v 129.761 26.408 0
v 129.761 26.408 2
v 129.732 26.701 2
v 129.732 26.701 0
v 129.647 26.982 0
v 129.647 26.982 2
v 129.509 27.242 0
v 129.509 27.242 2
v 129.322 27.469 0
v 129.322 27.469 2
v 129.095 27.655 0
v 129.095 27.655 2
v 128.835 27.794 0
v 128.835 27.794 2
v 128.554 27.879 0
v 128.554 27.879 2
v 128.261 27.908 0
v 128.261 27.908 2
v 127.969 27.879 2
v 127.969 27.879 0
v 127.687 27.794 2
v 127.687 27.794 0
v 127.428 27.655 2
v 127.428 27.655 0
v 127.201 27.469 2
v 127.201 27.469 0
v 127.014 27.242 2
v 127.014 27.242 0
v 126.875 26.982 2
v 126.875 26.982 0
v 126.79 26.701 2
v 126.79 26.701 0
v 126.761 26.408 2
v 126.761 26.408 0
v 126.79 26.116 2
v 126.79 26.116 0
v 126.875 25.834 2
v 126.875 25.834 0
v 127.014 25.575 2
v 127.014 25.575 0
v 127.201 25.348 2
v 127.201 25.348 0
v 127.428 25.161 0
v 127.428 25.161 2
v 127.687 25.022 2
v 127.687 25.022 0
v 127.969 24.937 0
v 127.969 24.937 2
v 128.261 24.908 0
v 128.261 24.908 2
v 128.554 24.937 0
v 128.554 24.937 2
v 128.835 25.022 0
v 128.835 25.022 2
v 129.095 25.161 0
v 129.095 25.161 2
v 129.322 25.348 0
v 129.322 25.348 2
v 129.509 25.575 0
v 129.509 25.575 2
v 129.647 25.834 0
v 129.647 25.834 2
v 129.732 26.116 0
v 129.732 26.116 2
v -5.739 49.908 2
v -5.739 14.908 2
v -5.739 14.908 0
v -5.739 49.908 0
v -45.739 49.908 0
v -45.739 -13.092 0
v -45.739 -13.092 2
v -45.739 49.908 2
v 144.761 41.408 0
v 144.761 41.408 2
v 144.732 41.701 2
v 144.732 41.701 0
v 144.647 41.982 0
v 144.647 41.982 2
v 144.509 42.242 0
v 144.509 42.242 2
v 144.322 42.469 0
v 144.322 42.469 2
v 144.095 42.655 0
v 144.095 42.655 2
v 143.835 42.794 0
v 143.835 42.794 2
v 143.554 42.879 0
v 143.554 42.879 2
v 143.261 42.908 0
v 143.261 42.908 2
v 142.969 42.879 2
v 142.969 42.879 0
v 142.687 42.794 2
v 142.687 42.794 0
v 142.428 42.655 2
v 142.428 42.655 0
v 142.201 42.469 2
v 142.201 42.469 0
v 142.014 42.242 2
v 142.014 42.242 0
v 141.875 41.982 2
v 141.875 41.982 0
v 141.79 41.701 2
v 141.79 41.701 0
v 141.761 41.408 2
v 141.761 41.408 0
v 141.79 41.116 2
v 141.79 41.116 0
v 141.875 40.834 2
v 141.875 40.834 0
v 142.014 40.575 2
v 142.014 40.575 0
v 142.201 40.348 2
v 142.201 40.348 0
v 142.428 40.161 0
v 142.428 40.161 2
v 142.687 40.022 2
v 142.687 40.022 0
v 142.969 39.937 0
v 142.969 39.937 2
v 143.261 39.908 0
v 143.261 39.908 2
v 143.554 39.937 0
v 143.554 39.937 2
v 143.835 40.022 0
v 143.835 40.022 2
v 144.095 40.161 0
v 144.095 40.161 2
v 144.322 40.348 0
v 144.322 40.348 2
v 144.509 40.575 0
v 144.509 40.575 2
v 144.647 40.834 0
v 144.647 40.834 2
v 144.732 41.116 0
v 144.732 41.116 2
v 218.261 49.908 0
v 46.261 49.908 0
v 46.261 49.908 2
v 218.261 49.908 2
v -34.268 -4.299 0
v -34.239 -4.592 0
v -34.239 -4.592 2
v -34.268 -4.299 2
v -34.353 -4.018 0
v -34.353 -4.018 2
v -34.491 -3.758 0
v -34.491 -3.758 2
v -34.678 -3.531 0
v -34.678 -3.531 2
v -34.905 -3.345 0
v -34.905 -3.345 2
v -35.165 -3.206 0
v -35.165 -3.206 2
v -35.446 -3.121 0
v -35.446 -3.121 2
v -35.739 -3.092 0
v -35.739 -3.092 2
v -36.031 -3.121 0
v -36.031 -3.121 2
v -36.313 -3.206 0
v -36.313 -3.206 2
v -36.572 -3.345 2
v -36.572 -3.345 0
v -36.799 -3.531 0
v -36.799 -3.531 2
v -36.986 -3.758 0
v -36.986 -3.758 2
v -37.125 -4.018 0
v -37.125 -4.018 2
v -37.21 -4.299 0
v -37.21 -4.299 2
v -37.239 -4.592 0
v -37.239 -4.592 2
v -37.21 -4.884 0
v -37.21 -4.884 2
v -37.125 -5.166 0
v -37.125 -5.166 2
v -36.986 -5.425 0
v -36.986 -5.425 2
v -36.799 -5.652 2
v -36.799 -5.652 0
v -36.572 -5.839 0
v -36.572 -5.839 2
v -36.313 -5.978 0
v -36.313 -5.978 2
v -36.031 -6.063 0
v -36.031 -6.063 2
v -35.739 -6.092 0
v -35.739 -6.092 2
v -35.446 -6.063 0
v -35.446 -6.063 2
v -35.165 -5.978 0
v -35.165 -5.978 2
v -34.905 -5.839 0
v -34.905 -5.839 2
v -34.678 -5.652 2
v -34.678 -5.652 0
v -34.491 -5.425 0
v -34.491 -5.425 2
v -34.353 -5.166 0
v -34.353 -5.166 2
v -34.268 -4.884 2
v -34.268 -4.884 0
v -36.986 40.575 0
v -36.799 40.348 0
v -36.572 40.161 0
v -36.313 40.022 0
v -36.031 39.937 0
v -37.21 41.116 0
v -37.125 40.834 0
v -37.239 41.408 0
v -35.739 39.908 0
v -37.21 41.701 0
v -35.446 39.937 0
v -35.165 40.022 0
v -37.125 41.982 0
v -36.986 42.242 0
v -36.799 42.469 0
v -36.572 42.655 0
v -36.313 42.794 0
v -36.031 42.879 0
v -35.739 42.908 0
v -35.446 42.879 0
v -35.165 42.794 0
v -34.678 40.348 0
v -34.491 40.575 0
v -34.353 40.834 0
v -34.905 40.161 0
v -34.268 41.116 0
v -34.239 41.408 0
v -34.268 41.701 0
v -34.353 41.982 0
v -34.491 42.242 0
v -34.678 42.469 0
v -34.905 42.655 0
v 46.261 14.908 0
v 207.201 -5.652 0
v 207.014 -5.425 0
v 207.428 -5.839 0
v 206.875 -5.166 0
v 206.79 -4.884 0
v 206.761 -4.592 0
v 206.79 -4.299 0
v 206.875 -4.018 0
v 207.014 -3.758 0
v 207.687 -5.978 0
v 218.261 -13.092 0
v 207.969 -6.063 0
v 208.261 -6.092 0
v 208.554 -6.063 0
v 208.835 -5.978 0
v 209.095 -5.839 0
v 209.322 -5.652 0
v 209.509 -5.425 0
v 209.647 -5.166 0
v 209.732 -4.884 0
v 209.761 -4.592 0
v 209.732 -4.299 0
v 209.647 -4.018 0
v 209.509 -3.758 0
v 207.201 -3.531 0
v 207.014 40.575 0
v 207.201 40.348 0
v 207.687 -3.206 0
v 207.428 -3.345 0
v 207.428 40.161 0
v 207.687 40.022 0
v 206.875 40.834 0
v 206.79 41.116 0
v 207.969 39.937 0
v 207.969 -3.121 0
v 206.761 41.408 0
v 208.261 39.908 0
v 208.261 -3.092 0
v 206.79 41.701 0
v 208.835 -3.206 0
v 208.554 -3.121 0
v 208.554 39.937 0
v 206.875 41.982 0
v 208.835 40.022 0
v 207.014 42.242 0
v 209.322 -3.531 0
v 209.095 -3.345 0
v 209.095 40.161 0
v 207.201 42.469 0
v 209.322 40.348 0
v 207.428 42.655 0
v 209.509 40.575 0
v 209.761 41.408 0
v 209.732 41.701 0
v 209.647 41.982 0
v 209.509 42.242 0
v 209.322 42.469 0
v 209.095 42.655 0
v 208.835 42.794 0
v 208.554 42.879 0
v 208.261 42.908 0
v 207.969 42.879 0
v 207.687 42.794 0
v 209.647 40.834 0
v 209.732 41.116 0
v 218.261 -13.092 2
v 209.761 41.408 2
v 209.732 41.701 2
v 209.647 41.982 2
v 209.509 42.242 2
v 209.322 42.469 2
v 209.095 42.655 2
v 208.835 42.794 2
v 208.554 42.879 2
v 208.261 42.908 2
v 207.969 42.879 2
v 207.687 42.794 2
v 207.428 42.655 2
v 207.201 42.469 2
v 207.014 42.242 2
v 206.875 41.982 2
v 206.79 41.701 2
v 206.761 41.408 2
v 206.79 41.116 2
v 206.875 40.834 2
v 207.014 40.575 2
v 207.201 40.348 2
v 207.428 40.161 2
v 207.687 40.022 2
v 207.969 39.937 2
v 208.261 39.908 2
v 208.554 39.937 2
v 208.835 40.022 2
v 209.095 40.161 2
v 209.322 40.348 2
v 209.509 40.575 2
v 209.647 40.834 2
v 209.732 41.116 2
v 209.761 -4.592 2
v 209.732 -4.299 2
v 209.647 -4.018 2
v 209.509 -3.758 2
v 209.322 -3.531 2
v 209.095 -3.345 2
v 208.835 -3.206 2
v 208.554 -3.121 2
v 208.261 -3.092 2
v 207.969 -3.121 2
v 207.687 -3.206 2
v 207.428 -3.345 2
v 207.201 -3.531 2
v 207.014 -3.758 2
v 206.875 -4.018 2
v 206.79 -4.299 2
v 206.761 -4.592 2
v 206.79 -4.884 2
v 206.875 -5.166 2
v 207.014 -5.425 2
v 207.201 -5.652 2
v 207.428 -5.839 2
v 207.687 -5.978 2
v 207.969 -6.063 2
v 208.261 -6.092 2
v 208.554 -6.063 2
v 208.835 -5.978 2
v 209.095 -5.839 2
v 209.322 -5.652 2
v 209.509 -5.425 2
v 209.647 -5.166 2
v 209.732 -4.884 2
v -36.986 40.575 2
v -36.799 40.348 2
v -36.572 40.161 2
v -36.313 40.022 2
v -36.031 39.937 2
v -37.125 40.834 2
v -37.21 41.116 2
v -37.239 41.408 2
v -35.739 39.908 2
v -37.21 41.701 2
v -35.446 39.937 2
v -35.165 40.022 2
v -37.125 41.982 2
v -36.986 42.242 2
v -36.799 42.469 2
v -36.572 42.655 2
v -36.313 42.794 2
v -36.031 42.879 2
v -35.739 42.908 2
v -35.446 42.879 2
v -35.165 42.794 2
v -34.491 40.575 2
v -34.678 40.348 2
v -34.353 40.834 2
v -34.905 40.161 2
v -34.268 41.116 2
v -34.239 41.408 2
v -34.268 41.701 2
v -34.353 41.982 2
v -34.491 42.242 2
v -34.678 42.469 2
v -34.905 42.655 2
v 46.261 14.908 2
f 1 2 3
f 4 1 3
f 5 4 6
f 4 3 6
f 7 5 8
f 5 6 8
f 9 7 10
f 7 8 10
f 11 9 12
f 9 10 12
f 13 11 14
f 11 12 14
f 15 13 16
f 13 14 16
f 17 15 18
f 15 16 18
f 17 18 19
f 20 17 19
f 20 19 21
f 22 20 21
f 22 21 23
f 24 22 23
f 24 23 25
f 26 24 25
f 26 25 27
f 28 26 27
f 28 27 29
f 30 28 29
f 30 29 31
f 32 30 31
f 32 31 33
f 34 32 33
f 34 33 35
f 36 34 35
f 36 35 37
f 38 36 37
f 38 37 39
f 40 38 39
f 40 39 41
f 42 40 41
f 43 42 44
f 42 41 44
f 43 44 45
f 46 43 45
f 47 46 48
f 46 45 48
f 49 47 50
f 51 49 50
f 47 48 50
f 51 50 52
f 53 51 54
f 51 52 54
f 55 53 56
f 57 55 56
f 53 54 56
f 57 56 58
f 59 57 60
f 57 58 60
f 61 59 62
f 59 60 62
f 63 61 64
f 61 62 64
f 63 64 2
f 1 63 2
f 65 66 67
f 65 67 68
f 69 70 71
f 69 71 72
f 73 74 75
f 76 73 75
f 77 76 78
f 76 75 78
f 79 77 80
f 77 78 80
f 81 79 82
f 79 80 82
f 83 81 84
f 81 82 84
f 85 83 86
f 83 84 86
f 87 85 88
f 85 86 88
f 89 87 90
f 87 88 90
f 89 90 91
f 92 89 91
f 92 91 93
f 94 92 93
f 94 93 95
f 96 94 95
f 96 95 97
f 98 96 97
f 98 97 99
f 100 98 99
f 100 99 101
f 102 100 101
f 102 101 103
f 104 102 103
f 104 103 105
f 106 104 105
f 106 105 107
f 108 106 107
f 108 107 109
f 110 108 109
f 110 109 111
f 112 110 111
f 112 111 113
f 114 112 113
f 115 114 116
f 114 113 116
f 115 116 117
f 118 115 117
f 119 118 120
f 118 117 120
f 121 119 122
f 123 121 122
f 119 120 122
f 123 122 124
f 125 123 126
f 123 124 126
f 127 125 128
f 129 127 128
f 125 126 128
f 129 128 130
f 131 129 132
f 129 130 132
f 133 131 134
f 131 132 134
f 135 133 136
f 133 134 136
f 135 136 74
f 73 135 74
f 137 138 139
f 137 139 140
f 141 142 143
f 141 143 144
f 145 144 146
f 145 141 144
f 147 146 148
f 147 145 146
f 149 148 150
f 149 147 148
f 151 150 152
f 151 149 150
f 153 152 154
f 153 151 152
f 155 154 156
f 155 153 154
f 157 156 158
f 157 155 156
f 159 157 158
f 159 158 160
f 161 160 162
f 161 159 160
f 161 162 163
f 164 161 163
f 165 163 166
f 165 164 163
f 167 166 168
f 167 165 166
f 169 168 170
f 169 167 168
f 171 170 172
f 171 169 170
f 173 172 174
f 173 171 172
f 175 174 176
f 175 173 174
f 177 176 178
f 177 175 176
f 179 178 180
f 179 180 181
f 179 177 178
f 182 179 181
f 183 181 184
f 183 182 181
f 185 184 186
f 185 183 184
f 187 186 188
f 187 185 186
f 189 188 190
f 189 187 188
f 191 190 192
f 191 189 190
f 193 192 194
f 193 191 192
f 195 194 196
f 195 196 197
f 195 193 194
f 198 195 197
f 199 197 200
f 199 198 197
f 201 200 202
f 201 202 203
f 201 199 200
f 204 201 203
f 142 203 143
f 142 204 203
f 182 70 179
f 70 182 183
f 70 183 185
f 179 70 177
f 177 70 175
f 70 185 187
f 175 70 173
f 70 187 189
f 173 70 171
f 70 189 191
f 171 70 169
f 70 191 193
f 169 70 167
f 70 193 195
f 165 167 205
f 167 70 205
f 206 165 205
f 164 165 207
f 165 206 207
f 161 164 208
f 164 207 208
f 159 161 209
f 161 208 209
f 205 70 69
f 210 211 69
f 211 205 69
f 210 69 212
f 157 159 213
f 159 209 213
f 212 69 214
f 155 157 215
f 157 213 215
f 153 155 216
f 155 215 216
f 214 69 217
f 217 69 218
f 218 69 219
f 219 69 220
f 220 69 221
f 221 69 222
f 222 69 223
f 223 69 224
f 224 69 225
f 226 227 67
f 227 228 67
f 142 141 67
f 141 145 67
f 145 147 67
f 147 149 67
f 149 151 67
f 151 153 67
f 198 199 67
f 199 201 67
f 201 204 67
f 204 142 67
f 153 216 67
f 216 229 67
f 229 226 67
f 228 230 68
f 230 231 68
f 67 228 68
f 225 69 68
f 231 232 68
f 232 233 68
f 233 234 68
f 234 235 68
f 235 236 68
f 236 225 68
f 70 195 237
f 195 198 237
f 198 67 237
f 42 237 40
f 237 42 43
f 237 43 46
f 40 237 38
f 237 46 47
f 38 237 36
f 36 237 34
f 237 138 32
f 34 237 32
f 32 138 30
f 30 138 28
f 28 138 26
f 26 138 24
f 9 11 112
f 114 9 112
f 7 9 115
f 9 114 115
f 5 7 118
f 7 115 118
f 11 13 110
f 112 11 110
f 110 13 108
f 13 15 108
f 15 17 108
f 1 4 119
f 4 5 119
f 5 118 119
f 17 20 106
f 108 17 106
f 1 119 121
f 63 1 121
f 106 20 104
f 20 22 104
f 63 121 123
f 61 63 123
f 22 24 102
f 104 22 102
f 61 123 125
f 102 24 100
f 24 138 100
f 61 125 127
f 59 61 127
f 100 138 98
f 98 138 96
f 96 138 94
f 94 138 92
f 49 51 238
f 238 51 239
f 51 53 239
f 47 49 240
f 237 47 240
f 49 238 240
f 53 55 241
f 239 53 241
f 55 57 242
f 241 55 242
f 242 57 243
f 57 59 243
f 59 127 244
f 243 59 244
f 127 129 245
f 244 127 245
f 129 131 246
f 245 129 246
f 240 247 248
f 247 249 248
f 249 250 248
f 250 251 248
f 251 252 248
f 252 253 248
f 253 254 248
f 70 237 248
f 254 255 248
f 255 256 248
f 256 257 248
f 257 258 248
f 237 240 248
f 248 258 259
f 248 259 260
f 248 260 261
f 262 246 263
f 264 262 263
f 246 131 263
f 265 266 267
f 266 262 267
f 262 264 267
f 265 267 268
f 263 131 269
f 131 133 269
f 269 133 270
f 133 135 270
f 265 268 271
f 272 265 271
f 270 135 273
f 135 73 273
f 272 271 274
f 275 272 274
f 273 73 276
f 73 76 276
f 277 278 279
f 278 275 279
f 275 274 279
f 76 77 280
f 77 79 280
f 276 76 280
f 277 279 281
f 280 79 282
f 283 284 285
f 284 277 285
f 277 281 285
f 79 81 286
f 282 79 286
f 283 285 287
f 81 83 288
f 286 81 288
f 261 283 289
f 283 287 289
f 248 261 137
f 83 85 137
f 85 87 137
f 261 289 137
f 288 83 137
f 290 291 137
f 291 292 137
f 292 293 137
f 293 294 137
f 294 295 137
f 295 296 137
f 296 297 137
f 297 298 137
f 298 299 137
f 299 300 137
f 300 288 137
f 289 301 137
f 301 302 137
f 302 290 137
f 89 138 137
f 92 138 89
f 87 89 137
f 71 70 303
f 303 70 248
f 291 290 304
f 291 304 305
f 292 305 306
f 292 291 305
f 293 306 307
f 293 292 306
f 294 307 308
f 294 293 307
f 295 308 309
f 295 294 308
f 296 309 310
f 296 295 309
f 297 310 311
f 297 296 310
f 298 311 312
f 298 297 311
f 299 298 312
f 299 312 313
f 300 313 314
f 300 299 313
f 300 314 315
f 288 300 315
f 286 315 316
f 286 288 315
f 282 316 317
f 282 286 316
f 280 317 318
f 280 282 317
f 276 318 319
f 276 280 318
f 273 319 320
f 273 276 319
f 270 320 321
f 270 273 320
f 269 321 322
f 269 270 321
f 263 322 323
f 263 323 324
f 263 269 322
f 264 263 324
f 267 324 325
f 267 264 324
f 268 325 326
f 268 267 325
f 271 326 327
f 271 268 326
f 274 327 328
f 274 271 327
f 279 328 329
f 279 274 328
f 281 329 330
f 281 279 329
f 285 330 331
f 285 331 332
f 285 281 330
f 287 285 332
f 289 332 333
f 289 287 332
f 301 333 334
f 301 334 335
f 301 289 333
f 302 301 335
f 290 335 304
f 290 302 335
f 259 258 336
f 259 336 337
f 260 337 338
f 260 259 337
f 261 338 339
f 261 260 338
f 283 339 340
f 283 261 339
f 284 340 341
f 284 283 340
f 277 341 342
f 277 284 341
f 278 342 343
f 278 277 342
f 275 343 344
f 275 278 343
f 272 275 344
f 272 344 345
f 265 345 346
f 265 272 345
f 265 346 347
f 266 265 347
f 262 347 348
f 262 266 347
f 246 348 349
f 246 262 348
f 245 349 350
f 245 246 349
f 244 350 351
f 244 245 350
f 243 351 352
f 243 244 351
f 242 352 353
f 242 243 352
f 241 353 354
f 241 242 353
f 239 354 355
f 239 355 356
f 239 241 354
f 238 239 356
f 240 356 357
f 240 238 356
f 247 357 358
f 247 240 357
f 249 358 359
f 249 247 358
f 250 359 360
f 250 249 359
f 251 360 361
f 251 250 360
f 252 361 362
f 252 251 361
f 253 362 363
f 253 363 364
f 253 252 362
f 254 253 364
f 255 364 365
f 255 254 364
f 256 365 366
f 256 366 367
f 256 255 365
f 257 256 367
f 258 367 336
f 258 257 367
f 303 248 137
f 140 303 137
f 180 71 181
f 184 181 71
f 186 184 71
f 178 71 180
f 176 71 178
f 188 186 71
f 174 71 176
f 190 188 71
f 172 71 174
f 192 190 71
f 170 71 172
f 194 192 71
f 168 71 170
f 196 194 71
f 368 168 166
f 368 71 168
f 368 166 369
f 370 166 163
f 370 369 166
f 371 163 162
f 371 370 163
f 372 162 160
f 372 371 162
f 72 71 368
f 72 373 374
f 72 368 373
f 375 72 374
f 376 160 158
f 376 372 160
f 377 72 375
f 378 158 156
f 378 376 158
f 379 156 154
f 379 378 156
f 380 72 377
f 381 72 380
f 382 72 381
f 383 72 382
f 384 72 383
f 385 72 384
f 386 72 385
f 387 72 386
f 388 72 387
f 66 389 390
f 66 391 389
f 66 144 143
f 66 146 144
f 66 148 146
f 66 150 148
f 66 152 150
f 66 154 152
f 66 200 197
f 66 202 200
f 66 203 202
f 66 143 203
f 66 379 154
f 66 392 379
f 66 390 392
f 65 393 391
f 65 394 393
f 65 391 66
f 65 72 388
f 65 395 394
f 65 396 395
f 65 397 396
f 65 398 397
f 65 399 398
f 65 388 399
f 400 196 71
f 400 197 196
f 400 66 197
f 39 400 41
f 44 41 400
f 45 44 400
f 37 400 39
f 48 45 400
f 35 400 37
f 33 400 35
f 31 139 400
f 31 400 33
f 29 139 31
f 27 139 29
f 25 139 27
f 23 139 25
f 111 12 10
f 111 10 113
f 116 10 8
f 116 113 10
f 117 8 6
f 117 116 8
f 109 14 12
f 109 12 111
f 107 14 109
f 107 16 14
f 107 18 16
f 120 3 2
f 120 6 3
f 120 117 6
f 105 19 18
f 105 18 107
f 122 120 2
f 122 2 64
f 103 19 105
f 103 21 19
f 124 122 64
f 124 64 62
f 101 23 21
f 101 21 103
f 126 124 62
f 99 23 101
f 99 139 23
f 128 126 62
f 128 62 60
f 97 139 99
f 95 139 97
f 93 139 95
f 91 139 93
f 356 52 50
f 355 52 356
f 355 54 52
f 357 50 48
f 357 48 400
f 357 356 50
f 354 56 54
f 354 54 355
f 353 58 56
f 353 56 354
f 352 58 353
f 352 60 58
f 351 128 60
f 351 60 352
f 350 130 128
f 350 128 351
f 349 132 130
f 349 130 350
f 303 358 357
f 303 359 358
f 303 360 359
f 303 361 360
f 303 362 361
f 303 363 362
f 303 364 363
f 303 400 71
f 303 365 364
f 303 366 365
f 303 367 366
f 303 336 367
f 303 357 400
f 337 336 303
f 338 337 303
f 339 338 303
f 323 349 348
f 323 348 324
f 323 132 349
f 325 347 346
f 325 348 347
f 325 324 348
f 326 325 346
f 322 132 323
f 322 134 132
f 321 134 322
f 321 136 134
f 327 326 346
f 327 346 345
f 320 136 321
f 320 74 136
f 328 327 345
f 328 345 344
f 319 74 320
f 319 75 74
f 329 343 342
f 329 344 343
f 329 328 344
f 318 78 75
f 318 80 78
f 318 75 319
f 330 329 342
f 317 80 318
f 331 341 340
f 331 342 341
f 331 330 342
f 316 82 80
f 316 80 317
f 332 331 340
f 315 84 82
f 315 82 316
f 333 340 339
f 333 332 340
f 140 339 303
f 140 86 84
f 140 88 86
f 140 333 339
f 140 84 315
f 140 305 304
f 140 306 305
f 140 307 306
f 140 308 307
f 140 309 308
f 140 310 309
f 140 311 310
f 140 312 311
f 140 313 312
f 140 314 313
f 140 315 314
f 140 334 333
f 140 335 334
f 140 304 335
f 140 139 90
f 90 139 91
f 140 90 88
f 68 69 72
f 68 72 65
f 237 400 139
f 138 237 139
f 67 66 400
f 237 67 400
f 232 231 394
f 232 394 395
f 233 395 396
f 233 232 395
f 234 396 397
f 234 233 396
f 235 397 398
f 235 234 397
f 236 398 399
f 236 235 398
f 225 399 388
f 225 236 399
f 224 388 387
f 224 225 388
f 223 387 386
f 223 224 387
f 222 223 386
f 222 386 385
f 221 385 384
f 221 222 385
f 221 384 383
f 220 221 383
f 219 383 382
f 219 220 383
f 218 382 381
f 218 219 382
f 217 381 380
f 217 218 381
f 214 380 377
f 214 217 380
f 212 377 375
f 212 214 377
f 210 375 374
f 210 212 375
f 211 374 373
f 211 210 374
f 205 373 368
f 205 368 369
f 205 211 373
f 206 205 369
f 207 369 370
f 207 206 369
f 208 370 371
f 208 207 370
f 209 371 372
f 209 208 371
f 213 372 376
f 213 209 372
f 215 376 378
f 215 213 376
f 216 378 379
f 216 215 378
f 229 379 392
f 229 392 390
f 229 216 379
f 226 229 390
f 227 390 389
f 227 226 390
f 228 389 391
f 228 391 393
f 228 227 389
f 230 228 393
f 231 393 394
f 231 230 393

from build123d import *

# Parameters (mm, degrees)
ESQUISSE1_W      = 264
ESQUISSE1_H      = 63
ESQUISSE1_R      = 1.5
EXTRUSION1_DEPTH = 2
ESQUISSE2_R      = 1.5
EXTRUSION2_DEPTH = 10
ESQUISSE3_W      = 52
ESQUISSE3_H      = 35
EXTRUSION3_DEPTH = 10


with BuildPart() as part:
    # Esquisse1 → Extrusion1 (new body)
    with BuildSketch(Plane.XY):
        with Locations((86.261300687, 18.408191489)):
            Rectangle(ESQUISSE1_W, ESQUISSE1_H)
        with Locations((-35.738699313, 41.408191489)):
            Circle(ESQUISSE1_R, mode=Mode.SUBTRACT)
        with Locations((-35.738699313, -4.591808511)):
            Circle(ESQUISSE1_R, mode=Mode.SUBTRACT)
        with Locations((208.261300687, 41.408191489)):
            Circle(ESQUISSE1_R, mode=Mode.SUBTRACT)
        with Locations((208.261300687, -4.591808511)):
            Circle(ESQUISSE1_R, mode=Mode.SUBTRACT)
    extrude(amount=EXTRUSION1_DEPTH)

    # Esquisse2 → Extrusion2 (cut)
    with BuildSketch(Plane.XY.offset(2)):
        with Locations((143.261300687, 41.408191489)):
            Circle(ESQUISSE2_R)
        with Locations((128.261300687, 26.408191489)):
            Circle(ESQUISSE2_R)
    extrude(amount=-EXTRUSION2_DEPTH, mode=Mode.SUBTRACT)

    # Esquisse3 → Extrusion3 (cut)
    with BuildSketch(Plane.XY.offset(2)):
        with Locations((20.261300687, 32.408191489)):
            Rectangle(ESQUISSE3_W, ESQUISSE3_H)
    extrude(amount=-EXTRUSION3_DEPTH, mode=Mode.SUBTRACT)


solid = part.part
